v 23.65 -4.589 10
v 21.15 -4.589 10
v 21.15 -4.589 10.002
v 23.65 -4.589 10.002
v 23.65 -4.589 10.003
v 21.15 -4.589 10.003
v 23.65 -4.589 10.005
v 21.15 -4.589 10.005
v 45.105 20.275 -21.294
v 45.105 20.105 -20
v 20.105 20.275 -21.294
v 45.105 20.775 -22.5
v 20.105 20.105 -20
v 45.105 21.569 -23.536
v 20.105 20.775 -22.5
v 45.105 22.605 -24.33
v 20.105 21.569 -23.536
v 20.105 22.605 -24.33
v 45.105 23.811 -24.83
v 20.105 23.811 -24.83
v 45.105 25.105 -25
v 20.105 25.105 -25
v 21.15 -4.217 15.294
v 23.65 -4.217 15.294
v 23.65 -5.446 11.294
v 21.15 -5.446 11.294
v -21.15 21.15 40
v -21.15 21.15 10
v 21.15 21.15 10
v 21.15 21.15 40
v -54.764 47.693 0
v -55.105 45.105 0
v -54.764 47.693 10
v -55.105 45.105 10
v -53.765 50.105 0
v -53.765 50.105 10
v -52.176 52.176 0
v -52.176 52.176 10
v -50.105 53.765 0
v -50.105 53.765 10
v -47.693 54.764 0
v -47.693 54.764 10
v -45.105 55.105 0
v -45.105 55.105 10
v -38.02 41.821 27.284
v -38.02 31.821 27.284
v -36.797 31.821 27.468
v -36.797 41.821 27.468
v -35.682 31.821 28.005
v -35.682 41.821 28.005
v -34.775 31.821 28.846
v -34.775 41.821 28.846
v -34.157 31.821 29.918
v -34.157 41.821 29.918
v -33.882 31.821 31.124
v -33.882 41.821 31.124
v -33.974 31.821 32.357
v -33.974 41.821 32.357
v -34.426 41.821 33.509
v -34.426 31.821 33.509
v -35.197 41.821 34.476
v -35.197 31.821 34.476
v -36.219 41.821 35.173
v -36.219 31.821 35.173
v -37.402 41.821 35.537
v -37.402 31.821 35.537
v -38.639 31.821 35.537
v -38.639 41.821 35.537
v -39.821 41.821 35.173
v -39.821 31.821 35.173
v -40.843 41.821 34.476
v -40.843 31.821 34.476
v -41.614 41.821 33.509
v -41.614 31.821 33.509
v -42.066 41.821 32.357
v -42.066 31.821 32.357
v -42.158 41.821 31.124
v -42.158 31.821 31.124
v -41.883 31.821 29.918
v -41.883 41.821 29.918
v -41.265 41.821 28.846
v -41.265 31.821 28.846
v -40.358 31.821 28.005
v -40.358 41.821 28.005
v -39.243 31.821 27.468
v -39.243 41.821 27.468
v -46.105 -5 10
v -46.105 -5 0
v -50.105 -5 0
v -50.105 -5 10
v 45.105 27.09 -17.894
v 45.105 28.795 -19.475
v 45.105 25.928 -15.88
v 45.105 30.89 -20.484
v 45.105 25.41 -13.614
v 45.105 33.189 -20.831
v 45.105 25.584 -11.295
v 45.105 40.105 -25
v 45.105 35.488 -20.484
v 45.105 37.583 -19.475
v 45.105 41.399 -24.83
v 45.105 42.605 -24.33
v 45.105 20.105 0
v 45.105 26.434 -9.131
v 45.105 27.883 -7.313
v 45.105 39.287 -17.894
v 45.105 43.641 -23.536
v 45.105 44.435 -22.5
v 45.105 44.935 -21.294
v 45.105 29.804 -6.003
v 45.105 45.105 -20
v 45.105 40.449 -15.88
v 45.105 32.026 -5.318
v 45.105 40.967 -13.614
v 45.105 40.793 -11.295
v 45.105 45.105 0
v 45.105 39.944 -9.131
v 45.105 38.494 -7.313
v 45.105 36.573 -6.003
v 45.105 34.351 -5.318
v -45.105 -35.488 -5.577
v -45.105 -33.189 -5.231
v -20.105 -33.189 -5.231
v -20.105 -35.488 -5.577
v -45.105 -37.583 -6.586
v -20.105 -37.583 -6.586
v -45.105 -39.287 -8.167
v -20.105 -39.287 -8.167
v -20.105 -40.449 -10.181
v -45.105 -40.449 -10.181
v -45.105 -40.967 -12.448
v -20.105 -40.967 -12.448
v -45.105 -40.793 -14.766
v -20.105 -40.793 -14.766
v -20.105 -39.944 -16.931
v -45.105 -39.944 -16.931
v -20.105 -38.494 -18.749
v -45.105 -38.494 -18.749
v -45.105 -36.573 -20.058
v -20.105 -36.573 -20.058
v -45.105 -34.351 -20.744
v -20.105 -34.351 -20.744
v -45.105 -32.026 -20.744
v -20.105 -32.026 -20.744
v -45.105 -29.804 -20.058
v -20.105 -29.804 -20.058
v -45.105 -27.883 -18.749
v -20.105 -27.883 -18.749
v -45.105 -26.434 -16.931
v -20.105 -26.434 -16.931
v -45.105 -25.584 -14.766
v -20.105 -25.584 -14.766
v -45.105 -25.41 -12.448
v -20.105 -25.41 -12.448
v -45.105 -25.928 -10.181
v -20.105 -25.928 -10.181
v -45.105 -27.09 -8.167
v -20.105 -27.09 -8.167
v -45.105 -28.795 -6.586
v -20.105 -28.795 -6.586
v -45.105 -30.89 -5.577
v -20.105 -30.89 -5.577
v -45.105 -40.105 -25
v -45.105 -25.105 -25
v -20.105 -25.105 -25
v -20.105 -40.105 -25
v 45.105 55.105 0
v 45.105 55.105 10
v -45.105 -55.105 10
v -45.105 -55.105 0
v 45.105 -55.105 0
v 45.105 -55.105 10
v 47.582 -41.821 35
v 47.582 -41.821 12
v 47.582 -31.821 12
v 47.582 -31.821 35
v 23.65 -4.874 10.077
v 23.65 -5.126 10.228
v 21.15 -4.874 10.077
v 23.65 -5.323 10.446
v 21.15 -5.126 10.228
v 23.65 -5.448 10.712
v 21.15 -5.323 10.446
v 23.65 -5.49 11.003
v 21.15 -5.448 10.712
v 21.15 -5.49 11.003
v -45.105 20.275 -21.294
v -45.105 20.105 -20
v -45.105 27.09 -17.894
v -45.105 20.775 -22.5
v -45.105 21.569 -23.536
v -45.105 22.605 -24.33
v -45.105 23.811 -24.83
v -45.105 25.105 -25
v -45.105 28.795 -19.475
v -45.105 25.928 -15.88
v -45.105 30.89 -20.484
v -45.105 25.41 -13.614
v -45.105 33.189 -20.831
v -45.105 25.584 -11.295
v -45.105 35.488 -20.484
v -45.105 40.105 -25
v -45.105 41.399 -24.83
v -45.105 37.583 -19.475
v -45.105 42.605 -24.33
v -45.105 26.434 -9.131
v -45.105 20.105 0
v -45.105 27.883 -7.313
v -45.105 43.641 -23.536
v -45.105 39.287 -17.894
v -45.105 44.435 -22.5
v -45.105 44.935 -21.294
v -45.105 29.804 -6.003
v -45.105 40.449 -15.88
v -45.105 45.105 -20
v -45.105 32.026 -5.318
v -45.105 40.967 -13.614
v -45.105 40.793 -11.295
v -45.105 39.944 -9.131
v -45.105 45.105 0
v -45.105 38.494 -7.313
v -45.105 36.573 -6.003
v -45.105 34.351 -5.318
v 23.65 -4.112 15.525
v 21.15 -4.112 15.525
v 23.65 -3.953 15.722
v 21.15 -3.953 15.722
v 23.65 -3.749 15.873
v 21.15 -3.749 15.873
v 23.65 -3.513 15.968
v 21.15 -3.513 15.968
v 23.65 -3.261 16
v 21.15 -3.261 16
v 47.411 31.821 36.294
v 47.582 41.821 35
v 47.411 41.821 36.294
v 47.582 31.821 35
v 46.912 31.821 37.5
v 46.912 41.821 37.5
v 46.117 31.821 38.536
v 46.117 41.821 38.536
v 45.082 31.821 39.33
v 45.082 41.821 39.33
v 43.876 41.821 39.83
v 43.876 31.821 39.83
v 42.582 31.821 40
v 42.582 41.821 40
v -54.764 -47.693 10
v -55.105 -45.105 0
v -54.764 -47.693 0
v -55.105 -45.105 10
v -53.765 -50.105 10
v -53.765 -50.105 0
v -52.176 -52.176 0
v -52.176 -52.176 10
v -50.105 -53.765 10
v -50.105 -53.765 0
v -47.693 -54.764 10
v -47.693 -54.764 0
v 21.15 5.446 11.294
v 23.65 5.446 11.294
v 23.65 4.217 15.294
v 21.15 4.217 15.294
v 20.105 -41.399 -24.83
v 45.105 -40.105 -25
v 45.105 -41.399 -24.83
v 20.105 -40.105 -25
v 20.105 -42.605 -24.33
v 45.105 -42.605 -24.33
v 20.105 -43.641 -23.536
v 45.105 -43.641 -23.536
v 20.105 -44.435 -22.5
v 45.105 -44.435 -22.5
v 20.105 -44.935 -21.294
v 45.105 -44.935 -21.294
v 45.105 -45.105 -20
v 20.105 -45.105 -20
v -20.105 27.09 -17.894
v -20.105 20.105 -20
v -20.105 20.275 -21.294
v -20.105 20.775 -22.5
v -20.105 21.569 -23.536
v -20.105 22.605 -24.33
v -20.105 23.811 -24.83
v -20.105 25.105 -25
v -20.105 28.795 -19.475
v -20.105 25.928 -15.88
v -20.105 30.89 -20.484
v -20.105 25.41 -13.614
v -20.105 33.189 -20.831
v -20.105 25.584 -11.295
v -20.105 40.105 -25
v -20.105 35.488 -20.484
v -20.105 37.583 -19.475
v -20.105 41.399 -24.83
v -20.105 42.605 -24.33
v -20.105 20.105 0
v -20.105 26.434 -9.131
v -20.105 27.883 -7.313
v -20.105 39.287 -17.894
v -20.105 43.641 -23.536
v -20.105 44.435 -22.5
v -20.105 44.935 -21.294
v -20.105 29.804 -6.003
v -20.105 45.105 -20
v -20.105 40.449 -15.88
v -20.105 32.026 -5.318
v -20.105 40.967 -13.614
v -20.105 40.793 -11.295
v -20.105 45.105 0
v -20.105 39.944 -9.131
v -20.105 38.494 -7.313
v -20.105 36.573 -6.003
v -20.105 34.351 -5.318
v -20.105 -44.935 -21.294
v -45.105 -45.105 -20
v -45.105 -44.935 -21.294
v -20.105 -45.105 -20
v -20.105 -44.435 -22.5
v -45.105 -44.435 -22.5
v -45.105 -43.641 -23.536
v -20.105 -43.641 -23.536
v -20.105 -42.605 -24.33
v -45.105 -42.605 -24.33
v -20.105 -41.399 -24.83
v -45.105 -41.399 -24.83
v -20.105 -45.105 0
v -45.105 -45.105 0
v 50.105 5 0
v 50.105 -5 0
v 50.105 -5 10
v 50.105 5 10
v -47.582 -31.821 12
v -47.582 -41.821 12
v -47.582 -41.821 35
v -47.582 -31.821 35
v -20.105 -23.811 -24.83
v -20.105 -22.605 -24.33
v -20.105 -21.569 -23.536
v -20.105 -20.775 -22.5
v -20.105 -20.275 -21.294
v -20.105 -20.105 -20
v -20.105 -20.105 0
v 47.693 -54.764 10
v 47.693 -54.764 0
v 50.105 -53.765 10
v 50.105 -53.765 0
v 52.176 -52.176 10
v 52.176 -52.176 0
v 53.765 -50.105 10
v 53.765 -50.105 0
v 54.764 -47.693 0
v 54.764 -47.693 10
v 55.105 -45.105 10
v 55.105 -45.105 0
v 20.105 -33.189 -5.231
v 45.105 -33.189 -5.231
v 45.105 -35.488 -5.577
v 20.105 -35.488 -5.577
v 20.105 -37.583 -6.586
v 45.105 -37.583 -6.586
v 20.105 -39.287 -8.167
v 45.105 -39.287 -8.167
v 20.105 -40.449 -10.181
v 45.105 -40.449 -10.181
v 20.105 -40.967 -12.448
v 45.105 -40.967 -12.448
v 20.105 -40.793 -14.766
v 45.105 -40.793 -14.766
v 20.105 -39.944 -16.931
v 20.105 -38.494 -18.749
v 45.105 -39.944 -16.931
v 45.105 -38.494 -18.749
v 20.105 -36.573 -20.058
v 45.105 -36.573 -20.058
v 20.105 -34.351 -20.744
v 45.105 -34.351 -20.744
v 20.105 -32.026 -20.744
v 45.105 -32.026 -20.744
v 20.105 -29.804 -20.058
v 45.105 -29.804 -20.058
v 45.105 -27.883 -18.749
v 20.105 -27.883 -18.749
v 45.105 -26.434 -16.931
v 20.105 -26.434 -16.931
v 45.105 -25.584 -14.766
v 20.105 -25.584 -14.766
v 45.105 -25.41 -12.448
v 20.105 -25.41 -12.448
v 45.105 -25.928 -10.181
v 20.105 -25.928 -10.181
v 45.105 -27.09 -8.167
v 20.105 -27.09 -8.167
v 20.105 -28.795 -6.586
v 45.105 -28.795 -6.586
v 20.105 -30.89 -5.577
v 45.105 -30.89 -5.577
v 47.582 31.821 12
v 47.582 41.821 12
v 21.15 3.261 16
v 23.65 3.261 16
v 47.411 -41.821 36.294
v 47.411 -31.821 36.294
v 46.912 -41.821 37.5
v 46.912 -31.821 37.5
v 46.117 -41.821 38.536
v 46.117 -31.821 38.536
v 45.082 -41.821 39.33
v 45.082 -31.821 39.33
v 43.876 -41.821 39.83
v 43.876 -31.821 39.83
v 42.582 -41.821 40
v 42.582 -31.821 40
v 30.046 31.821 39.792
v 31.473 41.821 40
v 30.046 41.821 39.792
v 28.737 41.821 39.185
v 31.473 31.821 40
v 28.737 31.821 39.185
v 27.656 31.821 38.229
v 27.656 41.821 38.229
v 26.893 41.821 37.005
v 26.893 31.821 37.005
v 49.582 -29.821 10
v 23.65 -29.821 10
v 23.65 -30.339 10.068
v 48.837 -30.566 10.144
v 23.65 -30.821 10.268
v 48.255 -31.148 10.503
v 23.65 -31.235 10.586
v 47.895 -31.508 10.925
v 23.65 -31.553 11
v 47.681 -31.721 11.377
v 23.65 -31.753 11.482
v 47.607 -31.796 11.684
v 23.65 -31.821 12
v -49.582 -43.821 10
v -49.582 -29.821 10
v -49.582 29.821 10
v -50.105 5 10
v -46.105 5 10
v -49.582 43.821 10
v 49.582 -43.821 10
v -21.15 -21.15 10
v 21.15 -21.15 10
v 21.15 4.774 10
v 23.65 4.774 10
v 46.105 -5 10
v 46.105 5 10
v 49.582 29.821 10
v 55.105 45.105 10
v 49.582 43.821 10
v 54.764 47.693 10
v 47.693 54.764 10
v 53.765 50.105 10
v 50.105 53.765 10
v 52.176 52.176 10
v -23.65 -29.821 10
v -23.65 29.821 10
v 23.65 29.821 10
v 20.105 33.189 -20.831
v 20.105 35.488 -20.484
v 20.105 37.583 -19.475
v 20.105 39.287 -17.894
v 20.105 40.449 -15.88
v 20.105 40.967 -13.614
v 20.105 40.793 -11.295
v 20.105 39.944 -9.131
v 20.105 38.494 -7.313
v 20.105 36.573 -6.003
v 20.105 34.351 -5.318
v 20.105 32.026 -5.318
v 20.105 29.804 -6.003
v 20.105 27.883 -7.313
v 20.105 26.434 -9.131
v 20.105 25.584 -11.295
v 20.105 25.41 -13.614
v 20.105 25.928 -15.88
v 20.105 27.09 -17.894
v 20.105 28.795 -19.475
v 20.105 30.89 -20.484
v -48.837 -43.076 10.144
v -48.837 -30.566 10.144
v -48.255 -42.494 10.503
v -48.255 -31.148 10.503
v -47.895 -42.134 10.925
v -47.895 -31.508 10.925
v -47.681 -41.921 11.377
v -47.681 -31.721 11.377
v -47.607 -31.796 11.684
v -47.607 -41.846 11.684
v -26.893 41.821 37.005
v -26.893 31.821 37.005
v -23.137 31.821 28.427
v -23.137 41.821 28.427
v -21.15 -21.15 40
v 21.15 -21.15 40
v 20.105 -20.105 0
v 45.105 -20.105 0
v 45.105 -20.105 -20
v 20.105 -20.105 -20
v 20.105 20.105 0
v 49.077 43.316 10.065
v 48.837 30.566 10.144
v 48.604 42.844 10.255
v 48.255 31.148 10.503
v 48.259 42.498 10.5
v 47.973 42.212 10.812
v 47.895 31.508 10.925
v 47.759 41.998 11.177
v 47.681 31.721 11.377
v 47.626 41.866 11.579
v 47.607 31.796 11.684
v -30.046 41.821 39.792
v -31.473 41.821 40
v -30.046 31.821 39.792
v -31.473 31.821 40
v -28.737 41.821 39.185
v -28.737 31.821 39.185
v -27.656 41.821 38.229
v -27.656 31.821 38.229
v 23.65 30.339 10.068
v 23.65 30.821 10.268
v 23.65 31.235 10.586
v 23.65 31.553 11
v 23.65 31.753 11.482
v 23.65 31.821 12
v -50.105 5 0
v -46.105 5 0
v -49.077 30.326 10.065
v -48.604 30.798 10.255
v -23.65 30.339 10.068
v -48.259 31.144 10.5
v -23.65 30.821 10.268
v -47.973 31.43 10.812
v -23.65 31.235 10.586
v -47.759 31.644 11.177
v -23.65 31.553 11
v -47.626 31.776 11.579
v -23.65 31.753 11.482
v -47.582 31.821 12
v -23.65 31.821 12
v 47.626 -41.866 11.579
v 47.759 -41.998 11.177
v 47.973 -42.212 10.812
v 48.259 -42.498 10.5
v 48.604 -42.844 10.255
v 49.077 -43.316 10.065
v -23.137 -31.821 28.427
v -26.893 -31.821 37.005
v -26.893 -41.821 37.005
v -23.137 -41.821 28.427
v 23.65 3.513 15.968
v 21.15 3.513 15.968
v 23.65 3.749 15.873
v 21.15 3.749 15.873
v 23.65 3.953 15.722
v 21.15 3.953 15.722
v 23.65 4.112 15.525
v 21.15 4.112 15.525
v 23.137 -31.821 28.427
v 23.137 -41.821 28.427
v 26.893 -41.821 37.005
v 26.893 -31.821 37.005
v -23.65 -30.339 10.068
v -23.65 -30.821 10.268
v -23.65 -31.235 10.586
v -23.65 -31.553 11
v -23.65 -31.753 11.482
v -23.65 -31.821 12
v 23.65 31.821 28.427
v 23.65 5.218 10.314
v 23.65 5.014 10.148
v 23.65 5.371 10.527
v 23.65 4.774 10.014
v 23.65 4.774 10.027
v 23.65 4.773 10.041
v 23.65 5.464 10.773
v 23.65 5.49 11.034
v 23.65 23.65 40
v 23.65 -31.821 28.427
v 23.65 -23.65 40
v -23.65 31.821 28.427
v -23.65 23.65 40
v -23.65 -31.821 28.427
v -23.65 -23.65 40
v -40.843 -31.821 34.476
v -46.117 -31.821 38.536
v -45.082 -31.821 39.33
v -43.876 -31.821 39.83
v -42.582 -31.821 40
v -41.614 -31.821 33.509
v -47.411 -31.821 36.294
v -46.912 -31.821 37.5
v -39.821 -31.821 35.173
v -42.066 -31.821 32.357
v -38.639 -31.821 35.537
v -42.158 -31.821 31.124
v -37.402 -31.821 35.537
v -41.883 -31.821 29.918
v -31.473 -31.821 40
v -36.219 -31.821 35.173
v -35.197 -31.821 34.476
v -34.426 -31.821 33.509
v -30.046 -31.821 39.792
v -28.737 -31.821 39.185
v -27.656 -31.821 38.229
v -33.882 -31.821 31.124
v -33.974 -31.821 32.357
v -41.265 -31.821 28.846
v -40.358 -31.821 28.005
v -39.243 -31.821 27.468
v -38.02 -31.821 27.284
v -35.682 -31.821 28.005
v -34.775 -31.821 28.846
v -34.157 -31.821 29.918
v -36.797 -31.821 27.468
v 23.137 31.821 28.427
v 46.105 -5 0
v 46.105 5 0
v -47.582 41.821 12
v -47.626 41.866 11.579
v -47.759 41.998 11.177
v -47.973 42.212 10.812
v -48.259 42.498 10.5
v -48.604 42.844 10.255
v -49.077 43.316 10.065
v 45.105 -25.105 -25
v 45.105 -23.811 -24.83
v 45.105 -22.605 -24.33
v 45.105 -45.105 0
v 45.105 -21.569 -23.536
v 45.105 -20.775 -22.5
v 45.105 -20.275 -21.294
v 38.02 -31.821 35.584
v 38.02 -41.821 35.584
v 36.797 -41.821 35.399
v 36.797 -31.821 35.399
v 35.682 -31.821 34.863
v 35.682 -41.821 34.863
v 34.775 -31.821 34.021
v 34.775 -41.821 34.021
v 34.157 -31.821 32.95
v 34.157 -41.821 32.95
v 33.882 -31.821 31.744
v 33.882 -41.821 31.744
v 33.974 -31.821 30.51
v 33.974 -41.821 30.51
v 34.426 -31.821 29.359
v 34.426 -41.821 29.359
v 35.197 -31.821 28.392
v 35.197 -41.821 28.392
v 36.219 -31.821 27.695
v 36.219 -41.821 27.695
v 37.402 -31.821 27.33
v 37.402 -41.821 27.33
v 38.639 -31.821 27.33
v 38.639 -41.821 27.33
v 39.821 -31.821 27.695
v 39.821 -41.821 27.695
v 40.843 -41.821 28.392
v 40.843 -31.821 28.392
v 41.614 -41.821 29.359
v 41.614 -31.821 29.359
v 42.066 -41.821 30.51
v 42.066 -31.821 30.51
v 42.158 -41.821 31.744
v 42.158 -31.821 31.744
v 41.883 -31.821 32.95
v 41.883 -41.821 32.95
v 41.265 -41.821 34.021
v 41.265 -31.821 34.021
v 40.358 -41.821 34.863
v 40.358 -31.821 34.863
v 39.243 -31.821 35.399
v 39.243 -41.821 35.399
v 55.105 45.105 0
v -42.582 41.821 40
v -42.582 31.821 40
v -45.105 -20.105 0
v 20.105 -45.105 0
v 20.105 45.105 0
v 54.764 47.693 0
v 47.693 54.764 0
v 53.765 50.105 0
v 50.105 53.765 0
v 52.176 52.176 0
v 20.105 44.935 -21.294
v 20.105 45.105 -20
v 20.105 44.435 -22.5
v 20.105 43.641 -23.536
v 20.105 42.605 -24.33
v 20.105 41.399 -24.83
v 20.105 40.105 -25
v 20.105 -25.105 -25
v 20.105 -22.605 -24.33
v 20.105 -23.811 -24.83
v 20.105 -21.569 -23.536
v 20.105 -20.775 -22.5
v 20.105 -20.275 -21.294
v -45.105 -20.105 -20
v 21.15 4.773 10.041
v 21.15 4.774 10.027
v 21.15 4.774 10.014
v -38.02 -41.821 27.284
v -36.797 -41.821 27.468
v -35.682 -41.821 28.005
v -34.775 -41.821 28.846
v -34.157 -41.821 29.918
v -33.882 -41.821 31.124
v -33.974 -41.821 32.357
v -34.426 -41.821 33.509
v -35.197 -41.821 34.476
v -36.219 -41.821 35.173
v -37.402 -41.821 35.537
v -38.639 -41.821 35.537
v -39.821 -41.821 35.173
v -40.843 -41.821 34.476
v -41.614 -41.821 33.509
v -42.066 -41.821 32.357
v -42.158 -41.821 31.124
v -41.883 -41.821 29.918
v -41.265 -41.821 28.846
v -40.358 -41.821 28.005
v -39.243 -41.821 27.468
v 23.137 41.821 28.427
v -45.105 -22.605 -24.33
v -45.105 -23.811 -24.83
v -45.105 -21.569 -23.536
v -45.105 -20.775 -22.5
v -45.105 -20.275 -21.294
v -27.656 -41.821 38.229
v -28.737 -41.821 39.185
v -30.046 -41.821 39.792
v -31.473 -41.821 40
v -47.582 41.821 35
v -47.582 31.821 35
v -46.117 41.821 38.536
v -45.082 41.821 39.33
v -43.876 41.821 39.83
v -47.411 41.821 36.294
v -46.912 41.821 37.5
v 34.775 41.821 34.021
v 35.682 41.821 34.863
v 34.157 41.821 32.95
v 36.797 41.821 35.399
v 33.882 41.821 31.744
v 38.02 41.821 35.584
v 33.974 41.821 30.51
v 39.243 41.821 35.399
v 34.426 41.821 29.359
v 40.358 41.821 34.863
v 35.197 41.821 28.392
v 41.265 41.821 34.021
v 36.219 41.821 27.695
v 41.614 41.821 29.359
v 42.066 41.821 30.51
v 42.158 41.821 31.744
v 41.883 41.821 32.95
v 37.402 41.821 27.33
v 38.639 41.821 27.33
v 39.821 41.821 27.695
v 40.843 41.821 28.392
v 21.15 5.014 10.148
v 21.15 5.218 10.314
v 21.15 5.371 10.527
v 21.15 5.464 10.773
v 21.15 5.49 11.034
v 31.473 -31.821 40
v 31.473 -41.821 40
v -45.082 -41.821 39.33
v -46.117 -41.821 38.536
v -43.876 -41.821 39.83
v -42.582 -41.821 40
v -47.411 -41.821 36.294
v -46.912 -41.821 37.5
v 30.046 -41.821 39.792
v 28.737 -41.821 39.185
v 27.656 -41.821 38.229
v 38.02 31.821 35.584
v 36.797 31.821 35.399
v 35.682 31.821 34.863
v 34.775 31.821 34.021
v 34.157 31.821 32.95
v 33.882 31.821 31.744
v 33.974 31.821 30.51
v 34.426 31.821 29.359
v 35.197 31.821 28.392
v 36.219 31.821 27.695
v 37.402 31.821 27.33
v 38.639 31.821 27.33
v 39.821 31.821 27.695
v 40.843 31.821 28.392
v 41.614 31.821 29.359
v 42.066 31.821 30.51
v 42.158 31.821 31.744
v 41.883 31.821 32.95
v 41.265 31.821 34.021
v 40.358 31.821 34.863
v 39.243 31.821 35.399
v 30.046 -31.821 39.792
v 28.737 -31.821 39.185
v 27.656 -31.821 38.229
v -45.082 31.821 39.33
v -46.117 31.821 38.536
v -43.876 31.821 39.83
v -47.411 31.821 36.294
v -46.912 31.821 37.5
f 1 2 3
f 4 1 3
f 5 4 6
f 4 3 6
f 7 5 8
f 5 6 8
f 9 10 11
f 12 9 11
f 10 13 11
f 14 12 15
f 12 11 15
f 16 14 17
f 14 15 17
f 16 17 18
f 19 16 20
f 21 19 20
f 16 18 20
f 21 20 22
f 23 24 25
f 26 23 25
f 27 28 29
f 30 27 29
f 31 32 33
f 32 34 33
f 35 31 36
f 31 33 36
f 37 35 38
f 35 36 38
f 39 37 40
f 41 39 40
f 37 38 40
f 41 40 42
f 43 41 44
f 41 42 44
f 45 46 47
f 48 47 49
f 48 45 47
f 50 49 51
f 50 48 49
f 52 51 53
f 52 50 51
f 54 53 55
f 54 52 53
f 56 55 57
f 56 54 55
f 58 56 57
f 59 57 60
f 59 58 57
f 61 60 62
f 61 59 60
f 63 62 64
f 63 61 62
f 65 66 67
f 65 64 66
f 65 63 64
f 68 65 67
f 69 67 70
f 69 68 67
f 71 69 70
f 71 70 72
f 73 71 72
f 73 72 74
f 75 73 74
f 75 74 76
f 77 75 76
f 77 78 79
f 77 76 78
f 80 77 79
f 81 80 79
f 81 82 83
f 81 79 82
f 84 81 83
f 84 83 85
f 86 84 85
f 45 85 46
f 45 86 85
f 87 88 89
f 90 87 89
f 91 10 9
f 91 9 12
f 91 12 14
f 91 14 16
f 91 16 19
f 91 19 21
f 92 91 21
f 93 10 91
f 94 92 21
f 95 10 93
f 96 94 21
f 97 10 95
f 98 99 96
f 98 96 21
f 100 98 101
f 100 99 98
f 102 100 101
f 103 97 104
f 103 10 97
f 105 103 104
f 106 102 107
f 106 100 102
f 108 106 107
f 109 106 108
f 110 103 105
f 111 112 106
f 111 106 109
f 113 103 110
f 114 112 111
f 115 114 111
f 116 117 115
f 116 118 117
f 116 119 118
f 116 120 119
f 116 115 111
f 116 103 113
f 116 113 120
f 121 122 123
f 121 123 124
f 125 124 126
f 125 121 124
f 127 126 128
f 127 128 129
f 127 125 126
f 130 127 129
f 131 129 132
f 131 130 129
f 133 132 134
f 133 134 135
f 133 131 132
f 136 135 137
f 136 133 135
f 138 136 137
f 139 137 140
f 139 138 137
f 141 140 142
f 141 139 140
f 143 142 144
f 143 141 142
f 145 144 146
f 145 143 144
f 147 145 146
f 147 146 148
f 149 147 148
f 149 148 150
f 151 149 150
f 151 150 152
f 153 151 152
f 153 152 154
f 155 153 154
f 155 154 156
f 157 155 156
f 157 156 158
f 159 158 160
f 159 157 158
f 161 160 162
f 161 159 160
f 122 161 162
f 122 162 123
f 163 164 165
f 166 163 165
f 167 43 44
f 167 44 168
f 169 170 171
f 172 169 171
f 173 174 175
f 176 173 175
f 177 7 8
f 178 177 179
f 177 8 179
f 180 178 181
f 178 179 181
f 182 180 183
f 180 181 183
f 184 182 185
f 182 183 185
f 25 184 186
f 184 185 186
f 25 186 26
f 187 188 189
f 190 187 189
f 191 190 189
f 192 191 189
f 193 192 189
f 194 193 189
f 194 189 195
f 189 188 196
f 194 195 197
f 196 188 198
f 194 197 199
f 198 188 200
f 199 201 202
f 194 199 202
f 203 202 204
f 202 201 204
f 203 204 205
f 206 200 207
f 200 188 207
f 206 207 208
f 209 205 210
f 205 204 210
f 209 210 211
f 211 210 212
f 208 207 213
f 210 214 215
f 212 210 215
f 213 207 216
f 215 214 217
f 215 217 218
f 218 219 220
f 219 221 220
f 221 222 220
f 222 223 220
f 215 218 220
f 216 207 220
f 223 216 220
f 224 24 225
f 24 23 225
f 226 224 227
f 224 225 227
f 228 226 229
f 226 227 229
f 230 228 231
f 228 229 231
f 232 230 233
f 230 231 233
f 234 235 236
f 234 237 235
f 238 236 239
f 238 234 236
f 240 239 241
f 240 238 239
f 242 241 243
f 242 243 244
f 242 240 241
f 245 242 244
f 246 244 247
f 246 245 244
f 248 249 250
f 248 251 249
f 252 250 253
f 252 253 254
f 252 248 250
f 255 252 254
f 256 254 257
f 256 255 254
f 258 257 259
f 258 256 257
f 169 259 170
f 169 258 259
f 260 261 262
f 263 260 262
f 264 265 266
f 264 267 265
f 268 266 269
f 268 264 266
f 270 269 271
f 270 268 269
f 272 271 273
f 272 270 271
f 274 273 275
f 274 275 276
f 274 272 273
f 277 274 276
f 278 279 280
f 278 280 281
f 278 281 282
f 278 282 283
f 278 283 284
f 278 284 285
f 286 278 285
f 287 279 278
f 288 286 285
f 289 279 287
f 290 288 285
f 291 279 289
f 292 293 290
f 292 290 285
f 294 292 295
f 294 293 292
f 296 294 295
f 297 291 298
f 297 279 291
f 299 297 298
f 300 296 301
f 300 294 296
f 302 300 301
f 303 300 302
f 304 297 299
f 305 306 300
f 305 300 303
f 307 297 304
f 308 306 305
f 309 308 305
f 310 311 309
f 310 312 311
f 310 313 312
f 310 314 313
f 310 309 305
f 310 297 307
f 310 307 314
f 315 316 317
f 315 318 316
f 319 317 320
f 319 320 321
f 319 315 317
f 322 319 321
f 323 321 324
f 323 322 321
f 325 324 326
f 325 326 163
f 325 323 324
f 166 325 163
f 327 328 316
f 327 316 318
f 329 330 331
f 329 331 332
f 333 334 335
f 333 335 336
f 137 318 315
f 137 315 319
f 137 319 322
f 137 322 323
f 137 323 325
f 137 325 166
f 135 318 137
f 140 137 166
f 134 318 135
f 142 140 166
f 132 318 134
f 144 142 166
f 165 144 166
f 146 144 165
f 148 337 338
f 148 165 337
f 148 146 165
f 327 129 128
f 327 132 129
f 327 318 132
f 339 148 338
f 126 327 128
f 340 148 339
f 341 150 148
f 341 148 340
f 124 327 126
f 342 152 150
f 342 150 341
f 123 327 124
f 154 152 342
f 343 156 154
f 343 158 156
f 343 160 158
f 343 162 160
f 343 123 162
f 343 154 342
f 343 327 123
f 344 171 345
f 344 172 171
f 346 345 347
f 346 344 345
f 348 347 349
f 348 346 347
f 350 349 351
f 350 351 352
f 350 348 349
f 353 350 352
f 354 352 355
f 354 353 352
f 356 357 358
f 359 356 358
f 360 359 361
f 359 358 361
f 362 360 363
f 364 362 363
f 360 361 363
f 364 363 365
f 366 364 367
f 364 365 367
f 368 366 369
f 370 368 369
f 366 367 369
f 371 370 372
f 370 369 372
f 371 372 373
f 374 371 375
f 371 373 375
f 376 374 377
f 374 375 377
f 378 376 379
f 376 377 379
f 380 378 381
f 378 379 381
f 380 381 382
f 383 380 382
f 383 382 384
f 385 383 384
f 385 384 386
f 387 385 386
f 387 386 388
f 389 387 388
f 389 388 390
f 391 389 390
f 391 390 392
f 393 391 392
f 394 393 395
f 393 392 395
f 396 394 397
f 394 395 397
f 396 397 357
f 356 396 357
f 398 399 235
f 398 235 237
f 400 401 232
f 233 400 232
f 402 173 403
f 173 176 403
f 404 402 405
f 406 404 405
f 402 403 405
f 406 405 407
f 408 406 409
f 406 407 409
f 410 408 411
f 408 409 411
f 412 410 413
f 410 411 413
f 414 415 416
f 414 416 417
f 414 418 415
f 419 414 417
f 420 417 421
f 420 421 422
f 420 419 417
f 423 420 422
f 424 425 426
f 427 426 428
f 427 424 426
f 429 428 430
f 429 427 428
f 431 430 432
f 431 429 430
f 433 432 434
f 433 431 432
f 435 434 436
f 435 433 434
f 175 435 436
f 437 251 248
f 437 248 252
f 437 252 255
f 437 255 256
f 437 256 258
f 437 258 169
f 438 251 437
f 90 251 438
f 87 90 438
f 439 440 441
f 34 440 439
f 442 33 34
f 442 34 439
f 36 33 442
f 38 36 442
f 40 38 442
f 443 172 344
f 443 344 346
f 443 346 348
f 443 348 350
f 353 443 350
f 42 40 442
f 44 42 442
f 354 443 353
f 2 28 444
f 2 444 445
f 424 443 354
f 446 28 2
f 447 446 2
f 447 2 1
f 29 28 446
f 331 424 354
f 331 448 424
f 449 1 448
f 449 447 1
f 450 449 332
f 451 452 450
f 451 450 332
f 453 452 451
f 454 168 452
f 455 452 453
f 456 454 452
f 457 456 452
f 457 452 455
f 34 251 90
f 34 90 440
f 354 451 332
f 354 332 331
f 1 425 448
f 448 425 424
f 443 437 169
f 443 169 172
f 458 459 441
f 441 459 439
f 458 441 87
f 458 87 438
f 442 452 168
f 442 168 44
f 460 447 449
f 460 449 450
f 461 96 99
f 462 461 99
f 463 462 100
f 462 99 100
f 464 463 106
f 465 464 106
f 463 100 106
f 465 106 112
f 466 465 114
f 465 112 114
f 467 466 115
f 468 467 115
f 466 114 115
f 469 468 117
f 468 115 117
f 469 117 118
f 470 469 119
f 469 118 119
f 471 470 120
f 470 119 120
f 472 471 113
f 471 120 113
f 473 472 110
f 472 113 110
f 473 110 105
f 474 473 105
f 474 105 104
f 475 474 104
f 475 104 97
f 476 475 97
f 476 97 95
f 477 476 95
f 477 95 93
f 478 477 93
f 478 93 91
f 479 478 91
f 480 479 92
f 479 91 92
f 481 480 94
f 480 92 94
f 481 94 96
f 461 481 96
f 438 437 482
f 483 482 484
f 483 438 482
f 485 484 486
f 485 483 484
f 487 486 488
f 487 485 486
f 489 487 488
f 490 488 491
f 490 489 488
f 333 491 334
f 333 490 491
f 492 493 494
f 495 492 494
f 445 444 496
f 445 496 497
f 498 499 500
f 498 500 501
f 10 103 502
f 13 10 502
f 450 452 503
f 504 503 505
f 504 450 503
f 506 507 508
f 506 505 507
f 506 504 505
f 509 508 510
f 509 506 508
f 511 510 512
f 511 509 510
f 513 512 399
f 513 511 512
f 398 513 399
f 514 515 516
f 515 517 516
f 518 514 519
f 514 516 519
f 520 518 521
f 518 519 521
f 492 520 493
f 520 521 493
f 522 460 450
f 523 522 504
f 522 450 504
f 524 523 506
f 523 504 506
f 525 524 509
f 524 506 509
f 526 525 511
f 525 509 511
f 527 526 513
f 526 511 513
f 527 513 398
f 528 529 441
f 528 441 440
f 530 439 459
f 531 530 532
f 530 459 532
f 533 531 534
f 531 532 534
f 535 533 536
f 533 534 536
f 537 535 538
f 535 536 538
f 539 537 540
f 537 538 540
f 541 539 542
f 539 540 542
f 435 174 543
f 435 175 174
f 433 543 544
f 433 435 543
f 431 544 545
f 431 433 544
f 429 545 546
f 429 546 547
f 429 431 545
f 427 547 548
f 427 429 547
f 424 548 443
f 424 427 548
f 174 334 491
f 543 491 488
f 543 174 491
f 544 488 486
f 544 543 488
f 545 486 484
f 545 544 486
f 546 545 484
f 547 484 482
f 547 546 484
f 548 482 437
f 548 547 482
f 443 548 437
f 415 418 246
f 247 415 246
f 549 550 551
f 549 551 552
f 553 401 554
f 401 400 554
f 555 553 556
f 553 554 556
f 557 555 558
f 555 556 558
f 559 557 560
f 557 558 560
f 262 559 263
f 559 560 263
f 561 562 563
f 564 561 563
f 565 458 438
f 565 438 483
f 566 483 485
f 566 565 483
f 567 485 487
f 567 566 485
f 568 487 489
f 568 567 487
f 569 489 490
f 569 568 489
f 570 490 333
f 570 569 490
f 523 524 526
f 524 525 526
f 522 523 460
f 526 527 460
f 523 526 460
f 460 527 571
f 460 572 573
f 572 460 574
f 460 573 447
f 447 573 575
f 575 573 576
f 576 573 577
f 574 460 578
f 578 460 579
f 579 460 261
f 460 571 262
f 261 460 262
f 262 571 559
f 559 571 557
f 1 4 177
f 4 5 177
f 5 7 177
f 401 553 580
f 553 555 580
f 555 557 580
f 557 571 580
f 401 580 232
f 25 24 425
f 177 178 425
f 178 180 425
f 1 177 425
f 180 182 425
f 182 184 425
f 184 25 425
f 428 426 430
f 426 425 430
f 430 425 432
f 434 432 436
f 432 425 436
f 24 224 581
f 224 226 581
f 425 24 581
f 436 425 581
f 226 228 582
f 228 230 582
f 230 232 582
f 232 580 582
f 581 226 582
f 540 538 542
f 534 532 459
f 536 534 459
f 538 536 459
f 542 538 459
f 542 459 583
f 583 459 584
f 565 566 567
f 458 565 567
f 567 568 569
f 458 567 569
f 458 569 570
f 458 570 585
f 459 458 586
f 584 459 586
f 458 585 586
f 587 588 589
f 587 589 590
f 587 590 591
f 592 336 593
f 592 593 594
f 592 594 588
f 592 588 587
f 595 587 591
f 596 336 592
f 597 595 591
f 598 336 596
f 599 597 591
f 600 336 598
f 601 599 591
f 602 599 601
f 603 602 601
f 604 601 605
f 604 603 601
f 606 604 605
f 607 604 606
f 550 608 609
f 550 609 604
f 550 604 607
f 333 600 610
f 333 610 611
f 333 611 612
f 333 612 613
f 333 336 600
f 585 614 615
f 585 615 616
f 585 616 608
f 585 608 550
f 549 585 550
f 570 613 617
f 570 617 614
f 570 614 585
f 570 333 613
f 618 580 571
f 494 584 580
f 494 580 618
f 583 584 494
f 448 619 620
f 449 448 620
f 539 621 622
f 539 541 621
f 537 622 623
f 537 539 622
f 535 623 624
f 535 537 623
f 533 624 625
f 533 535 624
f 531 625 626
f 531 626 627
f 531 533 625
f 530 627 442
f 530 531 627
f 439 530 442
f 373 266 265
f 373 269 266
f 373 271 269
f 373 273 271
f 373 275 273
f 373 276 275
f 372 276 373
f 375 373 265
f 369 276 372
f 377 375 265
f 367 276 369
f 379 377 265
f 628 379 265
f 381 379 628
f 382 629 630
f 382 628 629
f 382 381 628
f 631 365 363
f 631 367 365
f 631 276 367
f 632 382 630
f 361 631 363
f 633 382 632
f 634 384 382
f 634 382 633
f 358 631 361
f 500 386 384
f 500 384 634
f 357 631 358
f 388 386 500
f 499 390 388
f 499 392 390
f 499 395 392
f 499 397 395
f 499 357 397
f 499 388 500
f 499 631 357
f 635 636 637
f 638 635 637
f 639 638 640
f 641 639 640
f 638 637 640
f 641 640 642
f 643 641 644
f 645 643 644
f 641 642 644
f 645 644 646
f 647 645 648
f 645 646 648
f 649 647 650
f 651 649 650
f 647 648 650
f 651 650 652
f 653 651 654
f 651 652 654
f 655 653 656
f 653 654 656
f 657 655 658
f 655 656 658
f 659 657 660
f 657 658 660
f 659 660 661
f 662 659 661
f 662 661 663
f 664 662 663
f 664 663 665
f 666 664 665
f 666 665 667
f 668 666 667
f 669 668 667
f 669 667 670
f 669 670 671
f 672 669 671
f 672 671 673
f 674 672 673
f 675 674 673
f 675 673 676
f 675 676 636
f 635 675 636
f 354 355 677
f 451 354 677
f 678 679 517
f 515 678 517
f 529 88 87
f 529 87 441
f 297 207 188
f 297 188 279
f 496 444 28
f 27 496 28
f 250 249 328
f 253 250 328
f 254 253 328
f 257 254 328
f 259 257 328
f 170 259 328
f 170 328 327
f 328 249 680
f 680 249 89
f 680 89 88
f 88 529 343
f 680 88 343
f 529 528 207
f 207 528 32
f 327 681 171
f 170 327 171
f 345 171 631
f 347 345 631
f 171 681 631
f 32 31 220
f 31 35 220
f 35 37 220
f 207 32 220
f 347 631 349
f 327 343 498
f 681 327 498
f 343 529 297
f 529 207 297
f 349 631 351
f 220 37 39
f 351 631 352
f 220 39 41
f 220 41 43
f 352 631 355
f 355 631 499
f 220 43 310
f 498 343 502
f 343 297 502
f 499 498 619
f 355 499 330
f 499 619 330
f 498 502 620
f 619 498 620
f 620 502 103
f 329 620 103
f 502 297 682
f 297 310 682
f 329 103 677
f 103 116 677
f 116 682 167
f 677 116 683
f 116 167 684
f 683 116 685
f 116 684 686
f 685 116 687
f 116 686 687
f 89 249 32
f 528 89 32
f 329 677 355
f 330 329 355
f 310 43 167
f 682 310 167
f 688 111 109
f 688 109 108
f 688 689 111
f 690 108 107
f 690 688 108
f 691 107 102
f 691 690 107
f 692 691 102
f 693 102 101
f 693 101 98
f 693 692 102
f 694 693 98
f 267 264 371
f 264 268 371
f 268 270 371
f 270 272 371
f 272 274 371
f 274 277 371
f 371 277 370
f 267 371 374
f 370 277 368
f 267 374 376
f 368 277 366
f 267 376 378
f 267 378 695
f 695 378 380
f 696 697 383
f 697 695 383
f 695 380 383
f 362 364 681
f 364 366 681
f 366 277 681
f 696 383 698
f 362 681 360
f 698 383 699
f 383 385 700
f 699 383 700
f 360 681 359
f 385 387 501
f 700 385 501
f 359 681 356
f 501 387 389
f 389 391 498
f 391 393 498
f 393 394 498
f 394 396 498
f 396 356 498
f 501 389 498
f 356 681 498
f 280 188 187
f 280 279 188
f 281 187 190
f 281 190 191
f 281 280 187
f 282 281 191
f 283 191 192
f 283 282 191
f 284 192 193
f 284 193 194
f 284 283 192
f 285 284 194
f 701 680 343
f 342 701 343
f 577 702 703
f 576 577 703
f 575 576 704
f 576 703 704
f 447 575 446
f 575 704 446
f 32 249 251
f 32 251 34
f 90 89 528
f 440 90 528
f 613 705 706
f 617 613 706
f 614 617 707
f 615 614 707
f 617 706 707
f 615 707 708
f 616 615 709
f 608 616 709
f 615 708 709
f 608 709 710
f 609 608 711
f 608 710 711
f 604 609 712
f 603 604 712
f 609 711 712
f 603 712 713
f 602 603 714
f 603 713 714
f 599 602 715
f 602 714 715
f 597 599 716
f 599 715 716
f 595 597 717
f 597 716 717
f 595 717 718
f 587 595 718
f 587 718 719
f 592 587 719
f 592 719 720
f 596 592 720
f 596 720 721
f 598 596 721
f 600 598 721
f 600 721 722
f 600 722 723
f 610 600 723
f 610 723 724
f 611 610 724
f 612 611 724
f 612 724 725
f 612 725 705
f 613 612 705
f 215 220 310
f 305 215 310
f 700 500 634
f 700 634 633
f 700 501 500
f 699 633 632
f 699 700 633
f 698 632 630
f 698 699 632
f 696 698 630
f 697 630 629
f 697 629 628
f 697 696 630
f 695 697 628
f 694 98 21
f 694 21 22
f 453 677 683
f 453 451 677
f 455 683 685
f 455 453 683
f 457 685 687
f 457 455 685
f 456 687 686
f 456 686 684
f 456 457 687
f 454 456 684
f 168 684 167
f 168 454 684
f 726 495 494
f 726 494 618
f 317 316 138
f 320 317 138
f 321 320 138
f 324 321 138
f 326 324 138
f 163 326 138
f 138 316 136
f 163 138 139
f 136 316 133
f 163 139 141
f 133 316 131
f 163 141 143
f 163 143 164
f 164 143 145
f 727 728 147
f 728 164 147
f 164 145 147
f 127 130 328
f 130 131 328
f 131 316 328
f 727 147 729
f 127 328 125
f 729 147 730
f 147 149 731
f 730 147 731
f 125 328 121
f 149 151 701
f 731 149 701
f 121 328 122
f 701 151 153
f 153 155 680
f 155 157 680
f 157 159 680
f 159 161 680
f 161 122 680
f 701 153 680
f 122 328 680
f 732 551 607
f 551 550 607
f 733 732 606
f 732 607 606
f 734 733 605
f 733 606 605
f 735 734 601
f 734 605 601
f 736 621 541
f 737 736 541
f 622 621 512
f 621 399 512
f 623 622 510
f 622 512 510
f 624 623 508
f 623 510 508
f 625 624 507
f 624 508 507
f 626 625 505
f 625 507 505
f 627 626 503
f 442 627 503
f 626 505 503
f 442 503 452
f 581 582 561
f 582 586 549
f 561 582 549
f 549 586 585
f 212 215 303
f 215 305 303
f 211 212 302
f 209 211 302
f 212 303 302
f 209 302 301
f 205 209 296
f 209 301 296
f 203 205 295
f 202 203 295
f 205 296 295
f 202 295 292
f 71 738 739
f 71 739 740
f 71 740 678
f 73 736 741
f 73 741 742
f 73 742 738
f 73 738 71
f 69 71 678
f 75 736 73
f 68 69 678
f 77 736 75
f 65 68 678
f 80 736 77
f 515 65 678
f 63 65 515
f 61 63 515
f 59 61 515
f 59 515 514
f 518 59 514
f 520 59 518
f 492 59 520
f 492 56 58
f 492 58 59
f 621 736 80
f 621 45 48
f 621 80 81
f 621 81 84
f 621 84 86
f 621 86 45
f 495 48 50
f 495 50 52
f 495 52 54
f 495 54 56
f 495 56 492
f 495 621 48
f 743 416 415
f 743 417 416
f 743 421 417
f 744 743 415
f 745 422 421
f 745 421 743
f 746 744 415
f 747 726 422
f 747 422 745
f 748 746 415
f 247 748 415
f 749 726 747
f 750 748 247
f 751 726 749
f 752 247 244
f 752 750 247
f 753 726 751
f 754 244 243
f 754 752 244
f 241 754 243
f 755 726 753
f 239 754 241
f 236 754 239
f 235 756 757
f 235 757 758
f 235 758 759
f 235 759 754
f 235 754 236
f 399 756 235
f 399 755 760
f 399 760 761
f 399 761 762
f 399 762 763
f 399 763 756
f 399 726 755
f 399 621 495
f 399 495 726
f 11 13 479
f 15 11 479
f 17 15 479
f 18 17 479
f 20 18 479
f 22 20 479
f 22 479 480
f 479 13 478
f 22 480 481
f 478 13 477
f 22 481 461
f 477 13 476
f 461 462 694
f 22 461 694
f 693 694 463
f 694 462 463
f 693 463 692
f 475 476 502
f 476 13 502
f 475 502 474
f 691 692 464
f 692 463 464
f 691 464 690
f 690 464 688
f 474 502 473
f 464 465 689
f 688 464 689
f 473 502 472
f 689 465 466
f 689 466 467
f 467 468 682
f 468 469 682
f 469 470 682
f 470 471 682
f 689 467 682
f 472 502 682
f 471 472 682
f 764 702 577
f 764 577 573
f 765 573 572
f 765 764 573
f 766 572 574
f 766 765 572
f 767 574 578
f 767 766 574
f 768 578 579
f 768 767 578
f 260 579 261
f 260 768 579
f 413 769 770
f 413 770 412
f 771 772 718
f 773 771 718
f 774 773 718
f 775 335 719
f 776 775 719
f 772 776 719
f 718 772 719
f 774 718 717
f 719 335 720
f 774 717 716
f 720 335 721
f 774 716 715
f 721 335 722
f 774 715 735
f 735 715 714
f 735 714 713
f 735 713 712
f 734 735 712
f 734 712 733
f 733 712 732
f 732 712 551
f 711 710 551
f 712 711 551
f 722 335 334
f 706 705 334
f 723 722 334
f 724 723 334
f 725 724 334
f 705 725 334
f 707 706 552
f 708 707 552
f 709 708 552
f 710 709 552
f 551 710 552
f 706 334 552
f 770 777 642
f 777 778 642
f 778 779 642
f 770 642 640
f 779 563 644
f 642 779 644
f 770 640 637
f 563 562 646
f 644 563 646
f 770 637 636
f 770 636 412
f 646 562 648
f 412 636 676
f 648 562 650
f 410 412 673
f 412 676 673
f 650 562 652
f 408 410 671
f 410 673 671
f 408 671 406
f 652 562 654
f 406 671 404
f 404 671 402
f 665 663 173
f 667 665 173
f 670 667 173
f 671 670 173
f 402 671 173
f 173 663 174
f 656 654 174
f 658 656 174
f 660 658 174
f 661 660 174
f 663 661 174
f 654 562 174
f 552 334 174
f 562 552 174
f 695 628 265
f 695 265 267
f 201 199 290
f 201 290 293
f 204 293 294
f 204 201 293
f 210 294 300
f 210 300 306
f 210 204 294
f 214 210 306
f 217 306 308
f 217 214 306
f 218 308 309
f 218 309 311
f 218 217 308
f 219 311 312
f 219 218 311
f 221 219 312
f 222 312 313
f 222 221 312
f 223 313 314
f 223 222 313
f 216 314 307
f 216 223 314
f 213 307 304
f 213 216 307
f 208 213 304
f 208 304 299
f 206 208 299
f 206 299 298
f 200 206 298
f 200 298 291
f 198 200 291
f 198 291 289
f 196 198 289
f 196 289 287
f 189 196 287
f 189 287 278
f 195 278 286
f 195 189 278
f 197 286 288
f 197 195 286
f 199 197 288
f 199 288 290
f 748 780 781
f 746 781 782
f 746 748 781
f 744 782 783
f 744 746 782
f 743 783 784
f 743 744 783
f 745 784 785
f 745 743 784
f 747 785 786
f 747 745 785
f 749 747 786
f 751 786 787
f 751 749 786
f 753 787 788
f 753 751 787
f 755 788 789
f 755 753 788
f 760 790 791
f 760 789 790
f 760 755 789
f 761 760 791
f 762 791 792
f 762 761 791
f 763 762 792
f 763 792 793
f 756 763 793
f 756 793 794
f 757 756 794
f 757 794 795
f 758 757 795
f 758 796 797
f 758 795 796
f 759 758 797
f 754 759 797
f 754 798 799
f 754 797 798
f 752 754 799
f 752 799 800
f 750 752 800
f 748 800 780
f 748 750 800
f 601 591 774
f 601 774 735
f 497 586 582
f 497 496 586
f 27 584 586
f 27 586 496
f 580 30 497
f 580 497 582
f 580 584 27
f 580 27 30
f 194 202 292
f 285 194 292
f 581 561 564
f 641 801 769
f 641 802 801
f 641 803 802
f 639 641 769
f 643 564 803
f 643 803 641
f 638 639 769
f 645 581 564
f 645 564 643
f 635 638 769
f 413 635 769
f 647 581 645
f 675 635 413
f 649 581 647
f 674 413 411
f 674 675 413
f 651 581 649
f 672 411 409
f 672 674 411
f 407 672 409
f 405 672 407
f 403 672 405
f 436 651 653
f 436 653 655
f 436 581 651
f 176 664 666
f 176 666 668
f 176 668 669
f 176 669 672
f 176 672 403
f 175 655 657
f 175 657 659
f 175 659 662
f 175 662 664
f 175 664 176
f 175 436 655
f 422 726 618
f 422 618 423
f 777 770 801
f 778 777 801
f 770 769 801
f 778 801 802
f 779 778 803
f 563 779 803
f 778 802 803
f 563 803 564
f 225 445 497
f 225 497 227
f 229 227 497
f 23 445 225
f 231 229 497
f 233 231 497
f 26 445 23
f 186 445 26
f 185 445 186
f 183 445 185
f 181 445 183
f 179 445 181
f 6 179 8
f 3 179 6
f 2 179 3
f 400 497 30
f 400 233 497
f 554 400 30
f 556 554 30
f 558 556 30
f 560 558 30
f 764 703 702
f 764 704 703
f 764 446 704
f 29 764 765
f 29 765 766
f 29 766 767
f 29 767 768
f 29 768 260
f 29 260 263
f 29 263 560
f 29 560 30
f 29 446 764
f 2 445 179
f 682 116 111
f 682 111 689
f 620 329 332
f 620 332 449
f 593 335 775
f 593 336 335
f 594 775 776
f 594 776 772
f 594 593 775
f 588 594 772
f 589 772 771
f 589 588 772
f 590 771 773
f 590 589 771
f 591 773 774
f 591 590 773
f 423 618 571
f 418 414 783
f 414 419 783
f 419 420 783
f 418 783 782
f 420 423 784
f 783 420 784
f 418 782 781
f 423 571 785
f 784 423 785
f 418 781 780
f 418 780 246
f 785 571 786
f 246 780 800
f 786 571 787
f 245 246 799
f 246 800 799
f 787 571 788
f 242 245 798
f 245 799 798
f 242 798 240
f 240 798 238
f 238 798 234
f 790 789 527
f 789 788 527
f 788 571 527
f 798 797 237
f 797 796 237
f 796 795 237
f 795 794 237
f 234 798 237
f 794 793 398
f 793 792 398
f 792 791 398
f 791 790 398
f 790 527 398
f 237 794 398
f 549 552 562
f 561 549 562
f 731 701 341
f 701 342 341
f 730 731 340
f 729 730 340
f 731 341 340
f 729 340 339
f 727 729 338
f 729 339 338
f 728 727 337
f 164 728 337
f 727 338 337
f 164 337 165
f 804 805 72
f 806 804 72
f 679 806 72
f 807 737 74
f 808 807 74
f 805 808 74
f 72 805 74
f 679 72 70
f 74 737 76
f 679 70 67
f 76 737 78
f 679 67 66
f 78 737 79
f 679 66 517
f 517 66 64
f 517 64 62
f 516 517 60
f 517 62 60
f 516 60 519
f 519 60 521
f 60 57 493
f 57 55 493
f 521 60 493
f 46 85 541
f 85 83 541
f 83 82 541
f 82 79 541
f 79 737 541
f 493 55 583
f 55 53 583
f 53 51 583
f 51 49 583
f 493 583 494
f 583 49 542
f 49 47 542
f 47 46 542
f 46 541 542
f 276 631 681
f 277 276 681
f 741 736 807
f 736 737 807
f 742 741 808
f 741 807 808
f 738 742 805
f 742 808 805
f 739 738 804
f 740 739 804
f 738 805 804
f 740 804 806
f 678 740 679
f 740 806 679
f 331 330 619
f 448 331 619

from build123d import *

# Parameters (mm, degrees)
SCHIZZO1_W                   = 110.21
SCHIZZO1_H                   = 110.21
ESTRUSIONE_ESTRUSIONE1_DEPTH = 10
RACCORDO1_R                  = 10
SCHIZZO6_W                   = 25
SCHIZZO6_H                   = 25
ESTRUSIONE_ESTRUSIONE2_DEPTH = 25
RACCORDO2_R                  = 5
SCHIZZO8_W                   = 47.3
SCHIZZO8_H                   = 47.3
SCHIZZO8_W_2                 = 42.3
SCHIZZO8_H_2                 = 42.3
ESTRUSIONE_ESTRUSIONE4_DEPTH = 30
SCHIZZO16_W                  = 4
SCHIZZO16_H                  = 10
TAGLIO_ESTRUSIONE11_DEPTH    = 10
SCHIZZO20_R                  = 7.8
TAGLIO_ESTRUSIONE12_DEPTH    = 25
RACCORDO11_R                 = 5
RACCORDO12_R                 = 5
RACCORDO13_R                 = 5
SCHIZZO10_W                  = 95.163374128
SCHIZZO10_H                  = 10
ESTRUSIONE_ESTRUSIONE5_DEPTH = 30
SCHIZZO21_R                  = 4.15
TAGLIO_ESTRUSIONE13_DEPTH    = 17
RACCORDO15_R                 = 5
RACCORDO16_R                 = 2
RACCORDO15_OF_SPECCHIA20_R   = 5
RACCORDO16_OF_SPECCHIA20_R   = 2
ESTRUSIONE_ESTRUSIONE7_REACH = 106.11
TAGLIO_ESTRUSIONE16_DEPTH    = 8.05
RACCORDO18_R                 = 1
TAGLIO_ESTRUSIONE14_DEPTH    = 17


with BuildPart() as part:
    # Schizzo1 → Estrusione-Estrusione1 (new body)
    with BuildSketch(Plane.XY):
        Rectangle(SCHIZZO1_W, SCHIZZO1_H)
    extrude(amount=ESTRUSIONE_ESTRUSIONE1_DEPTH)

    # Raccordo1
    raccordo1_edges = [part.edges().sort_by_distance(p)[0] for p in [
        (55.105, -55.105, 5),
        (-55.105, -55.105, 5),
        (-55.105, 55.105, 5),
        (55.105, 55.105, 5),
    ]]
    fillet(raccordo1_edges, radius=RACCORDO1_R)

    # Schizzo6 → Estrusione-Estrusione2 (add)
    with BuildSketch(Plane(origin=(0, 0, 0), x_dir=(-1, 0, 0), z_dir=(0, 0, -1))):
        with Locations((-32.605, 32.605)):
            Rectangle(SCHIZZO6_W, SCHIZZO6_H)
        with Locations((-32.605, -32.605)):
            Rectangle(SCHIZZO6_W, SCHIZZO6_H)
    estrusione_estrusione2 = extrude(amount=ESTRUSIONE_ESTRUSIONE2_DEPTH)

    # Raccordo2
    raccordo2_edges = [part.edges().sort_by_distance(p)[0] for p in [
        (32.605, 20.105, -25),
        (32.605, 45.105, -25),
    ]]
    fillet(raccordo2_edges, radius=RACCORDO2_R)

    # Schizzo8 → Estrusione-Estrusione4 (add)
    with BuildSketch(Plane.XY.offset(10)):
        Rectangle(SCHIZZO8_W, SCHIZZO8_H)
        Rectangle(SCHIZZO8_W_2, SCHIZZO8_H_2, mode=Mode.SUBTRACT)
    extrude(amount=ESTRUSIONE_ESTRUSIONE4_DEPTH)

    # Schizzo16 → Taglio-Estrusione11 (cut)
    with BuildSketch(Plane(origin=(0, 0, 0), x_dir=(-1, 0, 0), z_dir=(0, 0, -1))):
        with Locations((-48.105, 0)):
            Rectangle(SCHIZZO16_W, SCHIZZO16_H)
        with Locations((48.105, 0)):
            Rectangle(SCHIZZO16_W, SCHIZZO16_H)
    extrude(amount=-TAGLIO_ESTRUSIONE11_DEPTH, mode=Mode.SUBTRACT)

    # Schizzo20 → Taglio-Estrusione12 (cut)
    with BuildSketch(Plane(origin=(45.105, 0, 0), x_dir=(0, 0, -1), z_dir=(1, 0, 0))):
        with Locations((13.030698379, 33.188614524)):
            Circle(SCHIZZO20_R)
        with Locations(Location((13.030698379, -33.188614524, 0), (0, 0, 180))):
            Circle(SCHIZZO20_R)
    taglio_estrusione12 = extrude(amount=-TAGLIO_ESTRUSIONE12_DEPTH, mode=Mode.SUBTRACT)

    # Raccordo11
    raccordo11_edges = [part.edges().sort_by_distance(p)[0] for p in [
        (32.605, -20.105, -25),
    ]]
    fillet(raccordo11_edges, radius=RACCORDO11_R)

    # Raccordo12
    raccordo12_edges = [part.edges().sort_by_distance(p)[0] for p in [
        (32.605, -45.105, -25),
    ]]
    fillet(raccordo12_edges, radius=RACCORDO12_R)

    # Specchia17: Estrusione-Estrusione2 across plane
    add(estrusione_estrusione2.mirror(Plane(origin=(0, 0, 0), x_dir=(0, 0, 1), z_dir=(1, 0, 0))))

    # Specchia19: Taglio-Estrusione12 across plane
    add(taglio_estrusione12.mirror(Plane(origin=(0, 0, 0), x_dir=(0, 0, 1), z_dir=(1, 0, 0))), mode=Mode.SUBTRACT)

    # Raccordo13
    raccordo13_edges = [part.edges().sort_by_distance(p)[0] for p in [
        (-32.605, 45.105, -25),
        (-32.605, 20.105, -25),
        (-32.605, -45.105, -25),
        (-32.605, -20.105, -25),
    ]]
    fillet(raccordo13_edges, radius=RACCORDO13_R)

    # Schizzo10 → Estrusione-Estrusione5 (add)
    with BuildSketch(Plane.XY.offset(10)):
        with Locations((0, -36.820977582)):
            Rectangle(SCHIZZO10_W, SCHIZZO10_H)
    estrusione_estrusione5 = extrude(amount=ESTRUSIONE_ESTRUSIONE5_DEPTH)

    # Schizzo21 → Taglio-Estrusione13 (cut)
    with BuildSketch(Plane.XZ.offset(41.820977582)):
        with Locations(Location((-38.020045692, 31.433841087, 0), (0, 0, 270))):
            Circle(SCHIZZO21_R)
        with Locations(Location((38.020045692, 31.433841087, 0), (0, 0, 90))):
            Circle(SCHIZZO21_R)
        Polygon((-28.203808042, 40), (-23.137362803, 28.426939363), (23.137362803, 28.426939363), (28.203808042, 40), align=None)
    taglio_estrusione13 = extrude(amount=-TAGLIO_ESTRUSIONE13_DEPTH, mode=Mode.SUBTRACT)

    # Raccordo15
    raccordo15_edges = [part.edges().sort_by_distance(p)[0] for p in [
        (47.581687064, -36.820977582, 40),
        (-47.581687064, -36.820977582, 40),
        (-28.203808042, -36.820977582, 40),
        (28.203808042, -36.820977582, 40),
    ]]
    fillet(raccordo15_edges, radius=RACCORDO15_R)

    # Raccordo16
    raccordo16_edges = [part.edges().sort_by_distance(p)[0] for p in [
        (-47.581687064, -36.820977582, 10),
        (0, -41.820977582, 10),
        (0, -31.820977582, 10),
        (47.581687064, -36.820977582, 10),
    ]]
    fillet(raccordo16_edges, radius=RACCORDO16_R)

    # Specchia20: Estrusione-Estrusione5, Taglio-Estrusione13 across plane
    add(estrusione_estrusione5.mirror(Plane.ZX))
    add(taglio_estrusione13.mirror(Plane.ZX), mode=Mode.SUBTRACT)

    # Raccordo15 of Specchia20
    raccordo15_of_specchia20_edges = [part.edges().sort_by_distance(p)[0] for p in [
        (47.581687064, 36.820977582, 40),
        (-47.581687064, 36.820977582, 40),
        (-28.203808042, 36.820977582, 40),
        (28.203808042, 36.820977582, 40),
    ]]
    fillet(raccordo15_of_specchia20_edges, radius=RACCORDO15_OF_SPECCHIA20_R)

    # Raccordo16 of Specchia20
    raccordo16_of_specchia20_edges = [part.edges().sort_by_distance(p)[0] for p in [
        (-47.581687064, 36.820977582, 10),
        (0, 41.820977582, 10),
        (0, 31.820977582, 10),
        (47.581687064, 36.820977582, 10),
    ]]
    fillet(raccordo16_of_specchia20_edges, radius=RACCORDO16_OF_SPECCHIA20_R)

    # Estrusione-Estrusione7: up to this face of the body (flat: up to its plane)
    estrusione_estrusione7_end = Plane(part.part.faces().sort_by_distance((23.65, 0, 25))[0])
    # Schizzo29 → Estrusione-Estrusione7 (add, up to the picked face)
    with BuildSketch(Plane.ZY.offset(23.65), mode=Mode.PRIVATE) as estrusione_estrusione7_sk1:
        Polygon((40, 23.65), (28.426939363, 31.820977582), (10, 31.820977582), (10, 23.65), align=None)
    estrusione_estrusione7_tool1 = split(extrude(estrusione_estrusione7_sk1.sketch, amount=-ESTRUSIONE_ESTRUSIONE7_REACH, mode=Mode.PRIVATE), bisect_by=estrusione_estrusione7_end, keep=Keep.BOTH, mode=Mode.PRIVATE)
    estrusione_estrusione7 = estrusione_estrusione7_tool1.solids().sort_by(Axis((-23.65, 27.410039, 22.337212), (1, 0, 0)))[0]
    add(estrusione_estrusione7)

    # Specchia22: Estrusione-Estrusione7 across plane
    add(estrusione_estrusione7.mirror(Plane.ZX))

    # Schizzo30 → Taglio-Estrusione16 (cut)
    with BuildSketch(Plane(origin=(23.65, 0, 0), x_dir=(0, 0, -1), z_dir=(1, 0, 0))):
        Polygon((-16, -4), (-10, -5.843863655), (-10, -4), (-10, 4), (-10, 5.843863655), (-16, 4), align=None)
    extrude(amount=-TAGLIO_ESTRUSIONE16_DEPTH, mode=Mode.SUBTRACT)

    # Raccordo18
    raccordo18_edges = [part.edges().sort_by_distance(p)[0] for p in [
        (22.4, -5.843863655, 10),
        (22.4, -4, 16),
        (22.4, 4, 16),
        (22.4, 5.843863655, 10),
    ]]
    fillet(raccordo18_edges, radius=RACCORDO18_R)

    # Schizzo28 → Taglio-Estrusione14 (cut)
    with BuildSketch(Plane.ZY.offset(-21.15)):
        with BuildLine():
            Line((10, 4.773633228), (10, -4.589423386))
            ThreePointArc((10, -4.589423386), (14.681528307, 0.092104921), (10, 4.773633228))
        make_face()
    extrude(amount=-TAGLIO_ESTRUSIONE14_DEPTH, mode=Mode.SUBTRACT)


solid = part.part
